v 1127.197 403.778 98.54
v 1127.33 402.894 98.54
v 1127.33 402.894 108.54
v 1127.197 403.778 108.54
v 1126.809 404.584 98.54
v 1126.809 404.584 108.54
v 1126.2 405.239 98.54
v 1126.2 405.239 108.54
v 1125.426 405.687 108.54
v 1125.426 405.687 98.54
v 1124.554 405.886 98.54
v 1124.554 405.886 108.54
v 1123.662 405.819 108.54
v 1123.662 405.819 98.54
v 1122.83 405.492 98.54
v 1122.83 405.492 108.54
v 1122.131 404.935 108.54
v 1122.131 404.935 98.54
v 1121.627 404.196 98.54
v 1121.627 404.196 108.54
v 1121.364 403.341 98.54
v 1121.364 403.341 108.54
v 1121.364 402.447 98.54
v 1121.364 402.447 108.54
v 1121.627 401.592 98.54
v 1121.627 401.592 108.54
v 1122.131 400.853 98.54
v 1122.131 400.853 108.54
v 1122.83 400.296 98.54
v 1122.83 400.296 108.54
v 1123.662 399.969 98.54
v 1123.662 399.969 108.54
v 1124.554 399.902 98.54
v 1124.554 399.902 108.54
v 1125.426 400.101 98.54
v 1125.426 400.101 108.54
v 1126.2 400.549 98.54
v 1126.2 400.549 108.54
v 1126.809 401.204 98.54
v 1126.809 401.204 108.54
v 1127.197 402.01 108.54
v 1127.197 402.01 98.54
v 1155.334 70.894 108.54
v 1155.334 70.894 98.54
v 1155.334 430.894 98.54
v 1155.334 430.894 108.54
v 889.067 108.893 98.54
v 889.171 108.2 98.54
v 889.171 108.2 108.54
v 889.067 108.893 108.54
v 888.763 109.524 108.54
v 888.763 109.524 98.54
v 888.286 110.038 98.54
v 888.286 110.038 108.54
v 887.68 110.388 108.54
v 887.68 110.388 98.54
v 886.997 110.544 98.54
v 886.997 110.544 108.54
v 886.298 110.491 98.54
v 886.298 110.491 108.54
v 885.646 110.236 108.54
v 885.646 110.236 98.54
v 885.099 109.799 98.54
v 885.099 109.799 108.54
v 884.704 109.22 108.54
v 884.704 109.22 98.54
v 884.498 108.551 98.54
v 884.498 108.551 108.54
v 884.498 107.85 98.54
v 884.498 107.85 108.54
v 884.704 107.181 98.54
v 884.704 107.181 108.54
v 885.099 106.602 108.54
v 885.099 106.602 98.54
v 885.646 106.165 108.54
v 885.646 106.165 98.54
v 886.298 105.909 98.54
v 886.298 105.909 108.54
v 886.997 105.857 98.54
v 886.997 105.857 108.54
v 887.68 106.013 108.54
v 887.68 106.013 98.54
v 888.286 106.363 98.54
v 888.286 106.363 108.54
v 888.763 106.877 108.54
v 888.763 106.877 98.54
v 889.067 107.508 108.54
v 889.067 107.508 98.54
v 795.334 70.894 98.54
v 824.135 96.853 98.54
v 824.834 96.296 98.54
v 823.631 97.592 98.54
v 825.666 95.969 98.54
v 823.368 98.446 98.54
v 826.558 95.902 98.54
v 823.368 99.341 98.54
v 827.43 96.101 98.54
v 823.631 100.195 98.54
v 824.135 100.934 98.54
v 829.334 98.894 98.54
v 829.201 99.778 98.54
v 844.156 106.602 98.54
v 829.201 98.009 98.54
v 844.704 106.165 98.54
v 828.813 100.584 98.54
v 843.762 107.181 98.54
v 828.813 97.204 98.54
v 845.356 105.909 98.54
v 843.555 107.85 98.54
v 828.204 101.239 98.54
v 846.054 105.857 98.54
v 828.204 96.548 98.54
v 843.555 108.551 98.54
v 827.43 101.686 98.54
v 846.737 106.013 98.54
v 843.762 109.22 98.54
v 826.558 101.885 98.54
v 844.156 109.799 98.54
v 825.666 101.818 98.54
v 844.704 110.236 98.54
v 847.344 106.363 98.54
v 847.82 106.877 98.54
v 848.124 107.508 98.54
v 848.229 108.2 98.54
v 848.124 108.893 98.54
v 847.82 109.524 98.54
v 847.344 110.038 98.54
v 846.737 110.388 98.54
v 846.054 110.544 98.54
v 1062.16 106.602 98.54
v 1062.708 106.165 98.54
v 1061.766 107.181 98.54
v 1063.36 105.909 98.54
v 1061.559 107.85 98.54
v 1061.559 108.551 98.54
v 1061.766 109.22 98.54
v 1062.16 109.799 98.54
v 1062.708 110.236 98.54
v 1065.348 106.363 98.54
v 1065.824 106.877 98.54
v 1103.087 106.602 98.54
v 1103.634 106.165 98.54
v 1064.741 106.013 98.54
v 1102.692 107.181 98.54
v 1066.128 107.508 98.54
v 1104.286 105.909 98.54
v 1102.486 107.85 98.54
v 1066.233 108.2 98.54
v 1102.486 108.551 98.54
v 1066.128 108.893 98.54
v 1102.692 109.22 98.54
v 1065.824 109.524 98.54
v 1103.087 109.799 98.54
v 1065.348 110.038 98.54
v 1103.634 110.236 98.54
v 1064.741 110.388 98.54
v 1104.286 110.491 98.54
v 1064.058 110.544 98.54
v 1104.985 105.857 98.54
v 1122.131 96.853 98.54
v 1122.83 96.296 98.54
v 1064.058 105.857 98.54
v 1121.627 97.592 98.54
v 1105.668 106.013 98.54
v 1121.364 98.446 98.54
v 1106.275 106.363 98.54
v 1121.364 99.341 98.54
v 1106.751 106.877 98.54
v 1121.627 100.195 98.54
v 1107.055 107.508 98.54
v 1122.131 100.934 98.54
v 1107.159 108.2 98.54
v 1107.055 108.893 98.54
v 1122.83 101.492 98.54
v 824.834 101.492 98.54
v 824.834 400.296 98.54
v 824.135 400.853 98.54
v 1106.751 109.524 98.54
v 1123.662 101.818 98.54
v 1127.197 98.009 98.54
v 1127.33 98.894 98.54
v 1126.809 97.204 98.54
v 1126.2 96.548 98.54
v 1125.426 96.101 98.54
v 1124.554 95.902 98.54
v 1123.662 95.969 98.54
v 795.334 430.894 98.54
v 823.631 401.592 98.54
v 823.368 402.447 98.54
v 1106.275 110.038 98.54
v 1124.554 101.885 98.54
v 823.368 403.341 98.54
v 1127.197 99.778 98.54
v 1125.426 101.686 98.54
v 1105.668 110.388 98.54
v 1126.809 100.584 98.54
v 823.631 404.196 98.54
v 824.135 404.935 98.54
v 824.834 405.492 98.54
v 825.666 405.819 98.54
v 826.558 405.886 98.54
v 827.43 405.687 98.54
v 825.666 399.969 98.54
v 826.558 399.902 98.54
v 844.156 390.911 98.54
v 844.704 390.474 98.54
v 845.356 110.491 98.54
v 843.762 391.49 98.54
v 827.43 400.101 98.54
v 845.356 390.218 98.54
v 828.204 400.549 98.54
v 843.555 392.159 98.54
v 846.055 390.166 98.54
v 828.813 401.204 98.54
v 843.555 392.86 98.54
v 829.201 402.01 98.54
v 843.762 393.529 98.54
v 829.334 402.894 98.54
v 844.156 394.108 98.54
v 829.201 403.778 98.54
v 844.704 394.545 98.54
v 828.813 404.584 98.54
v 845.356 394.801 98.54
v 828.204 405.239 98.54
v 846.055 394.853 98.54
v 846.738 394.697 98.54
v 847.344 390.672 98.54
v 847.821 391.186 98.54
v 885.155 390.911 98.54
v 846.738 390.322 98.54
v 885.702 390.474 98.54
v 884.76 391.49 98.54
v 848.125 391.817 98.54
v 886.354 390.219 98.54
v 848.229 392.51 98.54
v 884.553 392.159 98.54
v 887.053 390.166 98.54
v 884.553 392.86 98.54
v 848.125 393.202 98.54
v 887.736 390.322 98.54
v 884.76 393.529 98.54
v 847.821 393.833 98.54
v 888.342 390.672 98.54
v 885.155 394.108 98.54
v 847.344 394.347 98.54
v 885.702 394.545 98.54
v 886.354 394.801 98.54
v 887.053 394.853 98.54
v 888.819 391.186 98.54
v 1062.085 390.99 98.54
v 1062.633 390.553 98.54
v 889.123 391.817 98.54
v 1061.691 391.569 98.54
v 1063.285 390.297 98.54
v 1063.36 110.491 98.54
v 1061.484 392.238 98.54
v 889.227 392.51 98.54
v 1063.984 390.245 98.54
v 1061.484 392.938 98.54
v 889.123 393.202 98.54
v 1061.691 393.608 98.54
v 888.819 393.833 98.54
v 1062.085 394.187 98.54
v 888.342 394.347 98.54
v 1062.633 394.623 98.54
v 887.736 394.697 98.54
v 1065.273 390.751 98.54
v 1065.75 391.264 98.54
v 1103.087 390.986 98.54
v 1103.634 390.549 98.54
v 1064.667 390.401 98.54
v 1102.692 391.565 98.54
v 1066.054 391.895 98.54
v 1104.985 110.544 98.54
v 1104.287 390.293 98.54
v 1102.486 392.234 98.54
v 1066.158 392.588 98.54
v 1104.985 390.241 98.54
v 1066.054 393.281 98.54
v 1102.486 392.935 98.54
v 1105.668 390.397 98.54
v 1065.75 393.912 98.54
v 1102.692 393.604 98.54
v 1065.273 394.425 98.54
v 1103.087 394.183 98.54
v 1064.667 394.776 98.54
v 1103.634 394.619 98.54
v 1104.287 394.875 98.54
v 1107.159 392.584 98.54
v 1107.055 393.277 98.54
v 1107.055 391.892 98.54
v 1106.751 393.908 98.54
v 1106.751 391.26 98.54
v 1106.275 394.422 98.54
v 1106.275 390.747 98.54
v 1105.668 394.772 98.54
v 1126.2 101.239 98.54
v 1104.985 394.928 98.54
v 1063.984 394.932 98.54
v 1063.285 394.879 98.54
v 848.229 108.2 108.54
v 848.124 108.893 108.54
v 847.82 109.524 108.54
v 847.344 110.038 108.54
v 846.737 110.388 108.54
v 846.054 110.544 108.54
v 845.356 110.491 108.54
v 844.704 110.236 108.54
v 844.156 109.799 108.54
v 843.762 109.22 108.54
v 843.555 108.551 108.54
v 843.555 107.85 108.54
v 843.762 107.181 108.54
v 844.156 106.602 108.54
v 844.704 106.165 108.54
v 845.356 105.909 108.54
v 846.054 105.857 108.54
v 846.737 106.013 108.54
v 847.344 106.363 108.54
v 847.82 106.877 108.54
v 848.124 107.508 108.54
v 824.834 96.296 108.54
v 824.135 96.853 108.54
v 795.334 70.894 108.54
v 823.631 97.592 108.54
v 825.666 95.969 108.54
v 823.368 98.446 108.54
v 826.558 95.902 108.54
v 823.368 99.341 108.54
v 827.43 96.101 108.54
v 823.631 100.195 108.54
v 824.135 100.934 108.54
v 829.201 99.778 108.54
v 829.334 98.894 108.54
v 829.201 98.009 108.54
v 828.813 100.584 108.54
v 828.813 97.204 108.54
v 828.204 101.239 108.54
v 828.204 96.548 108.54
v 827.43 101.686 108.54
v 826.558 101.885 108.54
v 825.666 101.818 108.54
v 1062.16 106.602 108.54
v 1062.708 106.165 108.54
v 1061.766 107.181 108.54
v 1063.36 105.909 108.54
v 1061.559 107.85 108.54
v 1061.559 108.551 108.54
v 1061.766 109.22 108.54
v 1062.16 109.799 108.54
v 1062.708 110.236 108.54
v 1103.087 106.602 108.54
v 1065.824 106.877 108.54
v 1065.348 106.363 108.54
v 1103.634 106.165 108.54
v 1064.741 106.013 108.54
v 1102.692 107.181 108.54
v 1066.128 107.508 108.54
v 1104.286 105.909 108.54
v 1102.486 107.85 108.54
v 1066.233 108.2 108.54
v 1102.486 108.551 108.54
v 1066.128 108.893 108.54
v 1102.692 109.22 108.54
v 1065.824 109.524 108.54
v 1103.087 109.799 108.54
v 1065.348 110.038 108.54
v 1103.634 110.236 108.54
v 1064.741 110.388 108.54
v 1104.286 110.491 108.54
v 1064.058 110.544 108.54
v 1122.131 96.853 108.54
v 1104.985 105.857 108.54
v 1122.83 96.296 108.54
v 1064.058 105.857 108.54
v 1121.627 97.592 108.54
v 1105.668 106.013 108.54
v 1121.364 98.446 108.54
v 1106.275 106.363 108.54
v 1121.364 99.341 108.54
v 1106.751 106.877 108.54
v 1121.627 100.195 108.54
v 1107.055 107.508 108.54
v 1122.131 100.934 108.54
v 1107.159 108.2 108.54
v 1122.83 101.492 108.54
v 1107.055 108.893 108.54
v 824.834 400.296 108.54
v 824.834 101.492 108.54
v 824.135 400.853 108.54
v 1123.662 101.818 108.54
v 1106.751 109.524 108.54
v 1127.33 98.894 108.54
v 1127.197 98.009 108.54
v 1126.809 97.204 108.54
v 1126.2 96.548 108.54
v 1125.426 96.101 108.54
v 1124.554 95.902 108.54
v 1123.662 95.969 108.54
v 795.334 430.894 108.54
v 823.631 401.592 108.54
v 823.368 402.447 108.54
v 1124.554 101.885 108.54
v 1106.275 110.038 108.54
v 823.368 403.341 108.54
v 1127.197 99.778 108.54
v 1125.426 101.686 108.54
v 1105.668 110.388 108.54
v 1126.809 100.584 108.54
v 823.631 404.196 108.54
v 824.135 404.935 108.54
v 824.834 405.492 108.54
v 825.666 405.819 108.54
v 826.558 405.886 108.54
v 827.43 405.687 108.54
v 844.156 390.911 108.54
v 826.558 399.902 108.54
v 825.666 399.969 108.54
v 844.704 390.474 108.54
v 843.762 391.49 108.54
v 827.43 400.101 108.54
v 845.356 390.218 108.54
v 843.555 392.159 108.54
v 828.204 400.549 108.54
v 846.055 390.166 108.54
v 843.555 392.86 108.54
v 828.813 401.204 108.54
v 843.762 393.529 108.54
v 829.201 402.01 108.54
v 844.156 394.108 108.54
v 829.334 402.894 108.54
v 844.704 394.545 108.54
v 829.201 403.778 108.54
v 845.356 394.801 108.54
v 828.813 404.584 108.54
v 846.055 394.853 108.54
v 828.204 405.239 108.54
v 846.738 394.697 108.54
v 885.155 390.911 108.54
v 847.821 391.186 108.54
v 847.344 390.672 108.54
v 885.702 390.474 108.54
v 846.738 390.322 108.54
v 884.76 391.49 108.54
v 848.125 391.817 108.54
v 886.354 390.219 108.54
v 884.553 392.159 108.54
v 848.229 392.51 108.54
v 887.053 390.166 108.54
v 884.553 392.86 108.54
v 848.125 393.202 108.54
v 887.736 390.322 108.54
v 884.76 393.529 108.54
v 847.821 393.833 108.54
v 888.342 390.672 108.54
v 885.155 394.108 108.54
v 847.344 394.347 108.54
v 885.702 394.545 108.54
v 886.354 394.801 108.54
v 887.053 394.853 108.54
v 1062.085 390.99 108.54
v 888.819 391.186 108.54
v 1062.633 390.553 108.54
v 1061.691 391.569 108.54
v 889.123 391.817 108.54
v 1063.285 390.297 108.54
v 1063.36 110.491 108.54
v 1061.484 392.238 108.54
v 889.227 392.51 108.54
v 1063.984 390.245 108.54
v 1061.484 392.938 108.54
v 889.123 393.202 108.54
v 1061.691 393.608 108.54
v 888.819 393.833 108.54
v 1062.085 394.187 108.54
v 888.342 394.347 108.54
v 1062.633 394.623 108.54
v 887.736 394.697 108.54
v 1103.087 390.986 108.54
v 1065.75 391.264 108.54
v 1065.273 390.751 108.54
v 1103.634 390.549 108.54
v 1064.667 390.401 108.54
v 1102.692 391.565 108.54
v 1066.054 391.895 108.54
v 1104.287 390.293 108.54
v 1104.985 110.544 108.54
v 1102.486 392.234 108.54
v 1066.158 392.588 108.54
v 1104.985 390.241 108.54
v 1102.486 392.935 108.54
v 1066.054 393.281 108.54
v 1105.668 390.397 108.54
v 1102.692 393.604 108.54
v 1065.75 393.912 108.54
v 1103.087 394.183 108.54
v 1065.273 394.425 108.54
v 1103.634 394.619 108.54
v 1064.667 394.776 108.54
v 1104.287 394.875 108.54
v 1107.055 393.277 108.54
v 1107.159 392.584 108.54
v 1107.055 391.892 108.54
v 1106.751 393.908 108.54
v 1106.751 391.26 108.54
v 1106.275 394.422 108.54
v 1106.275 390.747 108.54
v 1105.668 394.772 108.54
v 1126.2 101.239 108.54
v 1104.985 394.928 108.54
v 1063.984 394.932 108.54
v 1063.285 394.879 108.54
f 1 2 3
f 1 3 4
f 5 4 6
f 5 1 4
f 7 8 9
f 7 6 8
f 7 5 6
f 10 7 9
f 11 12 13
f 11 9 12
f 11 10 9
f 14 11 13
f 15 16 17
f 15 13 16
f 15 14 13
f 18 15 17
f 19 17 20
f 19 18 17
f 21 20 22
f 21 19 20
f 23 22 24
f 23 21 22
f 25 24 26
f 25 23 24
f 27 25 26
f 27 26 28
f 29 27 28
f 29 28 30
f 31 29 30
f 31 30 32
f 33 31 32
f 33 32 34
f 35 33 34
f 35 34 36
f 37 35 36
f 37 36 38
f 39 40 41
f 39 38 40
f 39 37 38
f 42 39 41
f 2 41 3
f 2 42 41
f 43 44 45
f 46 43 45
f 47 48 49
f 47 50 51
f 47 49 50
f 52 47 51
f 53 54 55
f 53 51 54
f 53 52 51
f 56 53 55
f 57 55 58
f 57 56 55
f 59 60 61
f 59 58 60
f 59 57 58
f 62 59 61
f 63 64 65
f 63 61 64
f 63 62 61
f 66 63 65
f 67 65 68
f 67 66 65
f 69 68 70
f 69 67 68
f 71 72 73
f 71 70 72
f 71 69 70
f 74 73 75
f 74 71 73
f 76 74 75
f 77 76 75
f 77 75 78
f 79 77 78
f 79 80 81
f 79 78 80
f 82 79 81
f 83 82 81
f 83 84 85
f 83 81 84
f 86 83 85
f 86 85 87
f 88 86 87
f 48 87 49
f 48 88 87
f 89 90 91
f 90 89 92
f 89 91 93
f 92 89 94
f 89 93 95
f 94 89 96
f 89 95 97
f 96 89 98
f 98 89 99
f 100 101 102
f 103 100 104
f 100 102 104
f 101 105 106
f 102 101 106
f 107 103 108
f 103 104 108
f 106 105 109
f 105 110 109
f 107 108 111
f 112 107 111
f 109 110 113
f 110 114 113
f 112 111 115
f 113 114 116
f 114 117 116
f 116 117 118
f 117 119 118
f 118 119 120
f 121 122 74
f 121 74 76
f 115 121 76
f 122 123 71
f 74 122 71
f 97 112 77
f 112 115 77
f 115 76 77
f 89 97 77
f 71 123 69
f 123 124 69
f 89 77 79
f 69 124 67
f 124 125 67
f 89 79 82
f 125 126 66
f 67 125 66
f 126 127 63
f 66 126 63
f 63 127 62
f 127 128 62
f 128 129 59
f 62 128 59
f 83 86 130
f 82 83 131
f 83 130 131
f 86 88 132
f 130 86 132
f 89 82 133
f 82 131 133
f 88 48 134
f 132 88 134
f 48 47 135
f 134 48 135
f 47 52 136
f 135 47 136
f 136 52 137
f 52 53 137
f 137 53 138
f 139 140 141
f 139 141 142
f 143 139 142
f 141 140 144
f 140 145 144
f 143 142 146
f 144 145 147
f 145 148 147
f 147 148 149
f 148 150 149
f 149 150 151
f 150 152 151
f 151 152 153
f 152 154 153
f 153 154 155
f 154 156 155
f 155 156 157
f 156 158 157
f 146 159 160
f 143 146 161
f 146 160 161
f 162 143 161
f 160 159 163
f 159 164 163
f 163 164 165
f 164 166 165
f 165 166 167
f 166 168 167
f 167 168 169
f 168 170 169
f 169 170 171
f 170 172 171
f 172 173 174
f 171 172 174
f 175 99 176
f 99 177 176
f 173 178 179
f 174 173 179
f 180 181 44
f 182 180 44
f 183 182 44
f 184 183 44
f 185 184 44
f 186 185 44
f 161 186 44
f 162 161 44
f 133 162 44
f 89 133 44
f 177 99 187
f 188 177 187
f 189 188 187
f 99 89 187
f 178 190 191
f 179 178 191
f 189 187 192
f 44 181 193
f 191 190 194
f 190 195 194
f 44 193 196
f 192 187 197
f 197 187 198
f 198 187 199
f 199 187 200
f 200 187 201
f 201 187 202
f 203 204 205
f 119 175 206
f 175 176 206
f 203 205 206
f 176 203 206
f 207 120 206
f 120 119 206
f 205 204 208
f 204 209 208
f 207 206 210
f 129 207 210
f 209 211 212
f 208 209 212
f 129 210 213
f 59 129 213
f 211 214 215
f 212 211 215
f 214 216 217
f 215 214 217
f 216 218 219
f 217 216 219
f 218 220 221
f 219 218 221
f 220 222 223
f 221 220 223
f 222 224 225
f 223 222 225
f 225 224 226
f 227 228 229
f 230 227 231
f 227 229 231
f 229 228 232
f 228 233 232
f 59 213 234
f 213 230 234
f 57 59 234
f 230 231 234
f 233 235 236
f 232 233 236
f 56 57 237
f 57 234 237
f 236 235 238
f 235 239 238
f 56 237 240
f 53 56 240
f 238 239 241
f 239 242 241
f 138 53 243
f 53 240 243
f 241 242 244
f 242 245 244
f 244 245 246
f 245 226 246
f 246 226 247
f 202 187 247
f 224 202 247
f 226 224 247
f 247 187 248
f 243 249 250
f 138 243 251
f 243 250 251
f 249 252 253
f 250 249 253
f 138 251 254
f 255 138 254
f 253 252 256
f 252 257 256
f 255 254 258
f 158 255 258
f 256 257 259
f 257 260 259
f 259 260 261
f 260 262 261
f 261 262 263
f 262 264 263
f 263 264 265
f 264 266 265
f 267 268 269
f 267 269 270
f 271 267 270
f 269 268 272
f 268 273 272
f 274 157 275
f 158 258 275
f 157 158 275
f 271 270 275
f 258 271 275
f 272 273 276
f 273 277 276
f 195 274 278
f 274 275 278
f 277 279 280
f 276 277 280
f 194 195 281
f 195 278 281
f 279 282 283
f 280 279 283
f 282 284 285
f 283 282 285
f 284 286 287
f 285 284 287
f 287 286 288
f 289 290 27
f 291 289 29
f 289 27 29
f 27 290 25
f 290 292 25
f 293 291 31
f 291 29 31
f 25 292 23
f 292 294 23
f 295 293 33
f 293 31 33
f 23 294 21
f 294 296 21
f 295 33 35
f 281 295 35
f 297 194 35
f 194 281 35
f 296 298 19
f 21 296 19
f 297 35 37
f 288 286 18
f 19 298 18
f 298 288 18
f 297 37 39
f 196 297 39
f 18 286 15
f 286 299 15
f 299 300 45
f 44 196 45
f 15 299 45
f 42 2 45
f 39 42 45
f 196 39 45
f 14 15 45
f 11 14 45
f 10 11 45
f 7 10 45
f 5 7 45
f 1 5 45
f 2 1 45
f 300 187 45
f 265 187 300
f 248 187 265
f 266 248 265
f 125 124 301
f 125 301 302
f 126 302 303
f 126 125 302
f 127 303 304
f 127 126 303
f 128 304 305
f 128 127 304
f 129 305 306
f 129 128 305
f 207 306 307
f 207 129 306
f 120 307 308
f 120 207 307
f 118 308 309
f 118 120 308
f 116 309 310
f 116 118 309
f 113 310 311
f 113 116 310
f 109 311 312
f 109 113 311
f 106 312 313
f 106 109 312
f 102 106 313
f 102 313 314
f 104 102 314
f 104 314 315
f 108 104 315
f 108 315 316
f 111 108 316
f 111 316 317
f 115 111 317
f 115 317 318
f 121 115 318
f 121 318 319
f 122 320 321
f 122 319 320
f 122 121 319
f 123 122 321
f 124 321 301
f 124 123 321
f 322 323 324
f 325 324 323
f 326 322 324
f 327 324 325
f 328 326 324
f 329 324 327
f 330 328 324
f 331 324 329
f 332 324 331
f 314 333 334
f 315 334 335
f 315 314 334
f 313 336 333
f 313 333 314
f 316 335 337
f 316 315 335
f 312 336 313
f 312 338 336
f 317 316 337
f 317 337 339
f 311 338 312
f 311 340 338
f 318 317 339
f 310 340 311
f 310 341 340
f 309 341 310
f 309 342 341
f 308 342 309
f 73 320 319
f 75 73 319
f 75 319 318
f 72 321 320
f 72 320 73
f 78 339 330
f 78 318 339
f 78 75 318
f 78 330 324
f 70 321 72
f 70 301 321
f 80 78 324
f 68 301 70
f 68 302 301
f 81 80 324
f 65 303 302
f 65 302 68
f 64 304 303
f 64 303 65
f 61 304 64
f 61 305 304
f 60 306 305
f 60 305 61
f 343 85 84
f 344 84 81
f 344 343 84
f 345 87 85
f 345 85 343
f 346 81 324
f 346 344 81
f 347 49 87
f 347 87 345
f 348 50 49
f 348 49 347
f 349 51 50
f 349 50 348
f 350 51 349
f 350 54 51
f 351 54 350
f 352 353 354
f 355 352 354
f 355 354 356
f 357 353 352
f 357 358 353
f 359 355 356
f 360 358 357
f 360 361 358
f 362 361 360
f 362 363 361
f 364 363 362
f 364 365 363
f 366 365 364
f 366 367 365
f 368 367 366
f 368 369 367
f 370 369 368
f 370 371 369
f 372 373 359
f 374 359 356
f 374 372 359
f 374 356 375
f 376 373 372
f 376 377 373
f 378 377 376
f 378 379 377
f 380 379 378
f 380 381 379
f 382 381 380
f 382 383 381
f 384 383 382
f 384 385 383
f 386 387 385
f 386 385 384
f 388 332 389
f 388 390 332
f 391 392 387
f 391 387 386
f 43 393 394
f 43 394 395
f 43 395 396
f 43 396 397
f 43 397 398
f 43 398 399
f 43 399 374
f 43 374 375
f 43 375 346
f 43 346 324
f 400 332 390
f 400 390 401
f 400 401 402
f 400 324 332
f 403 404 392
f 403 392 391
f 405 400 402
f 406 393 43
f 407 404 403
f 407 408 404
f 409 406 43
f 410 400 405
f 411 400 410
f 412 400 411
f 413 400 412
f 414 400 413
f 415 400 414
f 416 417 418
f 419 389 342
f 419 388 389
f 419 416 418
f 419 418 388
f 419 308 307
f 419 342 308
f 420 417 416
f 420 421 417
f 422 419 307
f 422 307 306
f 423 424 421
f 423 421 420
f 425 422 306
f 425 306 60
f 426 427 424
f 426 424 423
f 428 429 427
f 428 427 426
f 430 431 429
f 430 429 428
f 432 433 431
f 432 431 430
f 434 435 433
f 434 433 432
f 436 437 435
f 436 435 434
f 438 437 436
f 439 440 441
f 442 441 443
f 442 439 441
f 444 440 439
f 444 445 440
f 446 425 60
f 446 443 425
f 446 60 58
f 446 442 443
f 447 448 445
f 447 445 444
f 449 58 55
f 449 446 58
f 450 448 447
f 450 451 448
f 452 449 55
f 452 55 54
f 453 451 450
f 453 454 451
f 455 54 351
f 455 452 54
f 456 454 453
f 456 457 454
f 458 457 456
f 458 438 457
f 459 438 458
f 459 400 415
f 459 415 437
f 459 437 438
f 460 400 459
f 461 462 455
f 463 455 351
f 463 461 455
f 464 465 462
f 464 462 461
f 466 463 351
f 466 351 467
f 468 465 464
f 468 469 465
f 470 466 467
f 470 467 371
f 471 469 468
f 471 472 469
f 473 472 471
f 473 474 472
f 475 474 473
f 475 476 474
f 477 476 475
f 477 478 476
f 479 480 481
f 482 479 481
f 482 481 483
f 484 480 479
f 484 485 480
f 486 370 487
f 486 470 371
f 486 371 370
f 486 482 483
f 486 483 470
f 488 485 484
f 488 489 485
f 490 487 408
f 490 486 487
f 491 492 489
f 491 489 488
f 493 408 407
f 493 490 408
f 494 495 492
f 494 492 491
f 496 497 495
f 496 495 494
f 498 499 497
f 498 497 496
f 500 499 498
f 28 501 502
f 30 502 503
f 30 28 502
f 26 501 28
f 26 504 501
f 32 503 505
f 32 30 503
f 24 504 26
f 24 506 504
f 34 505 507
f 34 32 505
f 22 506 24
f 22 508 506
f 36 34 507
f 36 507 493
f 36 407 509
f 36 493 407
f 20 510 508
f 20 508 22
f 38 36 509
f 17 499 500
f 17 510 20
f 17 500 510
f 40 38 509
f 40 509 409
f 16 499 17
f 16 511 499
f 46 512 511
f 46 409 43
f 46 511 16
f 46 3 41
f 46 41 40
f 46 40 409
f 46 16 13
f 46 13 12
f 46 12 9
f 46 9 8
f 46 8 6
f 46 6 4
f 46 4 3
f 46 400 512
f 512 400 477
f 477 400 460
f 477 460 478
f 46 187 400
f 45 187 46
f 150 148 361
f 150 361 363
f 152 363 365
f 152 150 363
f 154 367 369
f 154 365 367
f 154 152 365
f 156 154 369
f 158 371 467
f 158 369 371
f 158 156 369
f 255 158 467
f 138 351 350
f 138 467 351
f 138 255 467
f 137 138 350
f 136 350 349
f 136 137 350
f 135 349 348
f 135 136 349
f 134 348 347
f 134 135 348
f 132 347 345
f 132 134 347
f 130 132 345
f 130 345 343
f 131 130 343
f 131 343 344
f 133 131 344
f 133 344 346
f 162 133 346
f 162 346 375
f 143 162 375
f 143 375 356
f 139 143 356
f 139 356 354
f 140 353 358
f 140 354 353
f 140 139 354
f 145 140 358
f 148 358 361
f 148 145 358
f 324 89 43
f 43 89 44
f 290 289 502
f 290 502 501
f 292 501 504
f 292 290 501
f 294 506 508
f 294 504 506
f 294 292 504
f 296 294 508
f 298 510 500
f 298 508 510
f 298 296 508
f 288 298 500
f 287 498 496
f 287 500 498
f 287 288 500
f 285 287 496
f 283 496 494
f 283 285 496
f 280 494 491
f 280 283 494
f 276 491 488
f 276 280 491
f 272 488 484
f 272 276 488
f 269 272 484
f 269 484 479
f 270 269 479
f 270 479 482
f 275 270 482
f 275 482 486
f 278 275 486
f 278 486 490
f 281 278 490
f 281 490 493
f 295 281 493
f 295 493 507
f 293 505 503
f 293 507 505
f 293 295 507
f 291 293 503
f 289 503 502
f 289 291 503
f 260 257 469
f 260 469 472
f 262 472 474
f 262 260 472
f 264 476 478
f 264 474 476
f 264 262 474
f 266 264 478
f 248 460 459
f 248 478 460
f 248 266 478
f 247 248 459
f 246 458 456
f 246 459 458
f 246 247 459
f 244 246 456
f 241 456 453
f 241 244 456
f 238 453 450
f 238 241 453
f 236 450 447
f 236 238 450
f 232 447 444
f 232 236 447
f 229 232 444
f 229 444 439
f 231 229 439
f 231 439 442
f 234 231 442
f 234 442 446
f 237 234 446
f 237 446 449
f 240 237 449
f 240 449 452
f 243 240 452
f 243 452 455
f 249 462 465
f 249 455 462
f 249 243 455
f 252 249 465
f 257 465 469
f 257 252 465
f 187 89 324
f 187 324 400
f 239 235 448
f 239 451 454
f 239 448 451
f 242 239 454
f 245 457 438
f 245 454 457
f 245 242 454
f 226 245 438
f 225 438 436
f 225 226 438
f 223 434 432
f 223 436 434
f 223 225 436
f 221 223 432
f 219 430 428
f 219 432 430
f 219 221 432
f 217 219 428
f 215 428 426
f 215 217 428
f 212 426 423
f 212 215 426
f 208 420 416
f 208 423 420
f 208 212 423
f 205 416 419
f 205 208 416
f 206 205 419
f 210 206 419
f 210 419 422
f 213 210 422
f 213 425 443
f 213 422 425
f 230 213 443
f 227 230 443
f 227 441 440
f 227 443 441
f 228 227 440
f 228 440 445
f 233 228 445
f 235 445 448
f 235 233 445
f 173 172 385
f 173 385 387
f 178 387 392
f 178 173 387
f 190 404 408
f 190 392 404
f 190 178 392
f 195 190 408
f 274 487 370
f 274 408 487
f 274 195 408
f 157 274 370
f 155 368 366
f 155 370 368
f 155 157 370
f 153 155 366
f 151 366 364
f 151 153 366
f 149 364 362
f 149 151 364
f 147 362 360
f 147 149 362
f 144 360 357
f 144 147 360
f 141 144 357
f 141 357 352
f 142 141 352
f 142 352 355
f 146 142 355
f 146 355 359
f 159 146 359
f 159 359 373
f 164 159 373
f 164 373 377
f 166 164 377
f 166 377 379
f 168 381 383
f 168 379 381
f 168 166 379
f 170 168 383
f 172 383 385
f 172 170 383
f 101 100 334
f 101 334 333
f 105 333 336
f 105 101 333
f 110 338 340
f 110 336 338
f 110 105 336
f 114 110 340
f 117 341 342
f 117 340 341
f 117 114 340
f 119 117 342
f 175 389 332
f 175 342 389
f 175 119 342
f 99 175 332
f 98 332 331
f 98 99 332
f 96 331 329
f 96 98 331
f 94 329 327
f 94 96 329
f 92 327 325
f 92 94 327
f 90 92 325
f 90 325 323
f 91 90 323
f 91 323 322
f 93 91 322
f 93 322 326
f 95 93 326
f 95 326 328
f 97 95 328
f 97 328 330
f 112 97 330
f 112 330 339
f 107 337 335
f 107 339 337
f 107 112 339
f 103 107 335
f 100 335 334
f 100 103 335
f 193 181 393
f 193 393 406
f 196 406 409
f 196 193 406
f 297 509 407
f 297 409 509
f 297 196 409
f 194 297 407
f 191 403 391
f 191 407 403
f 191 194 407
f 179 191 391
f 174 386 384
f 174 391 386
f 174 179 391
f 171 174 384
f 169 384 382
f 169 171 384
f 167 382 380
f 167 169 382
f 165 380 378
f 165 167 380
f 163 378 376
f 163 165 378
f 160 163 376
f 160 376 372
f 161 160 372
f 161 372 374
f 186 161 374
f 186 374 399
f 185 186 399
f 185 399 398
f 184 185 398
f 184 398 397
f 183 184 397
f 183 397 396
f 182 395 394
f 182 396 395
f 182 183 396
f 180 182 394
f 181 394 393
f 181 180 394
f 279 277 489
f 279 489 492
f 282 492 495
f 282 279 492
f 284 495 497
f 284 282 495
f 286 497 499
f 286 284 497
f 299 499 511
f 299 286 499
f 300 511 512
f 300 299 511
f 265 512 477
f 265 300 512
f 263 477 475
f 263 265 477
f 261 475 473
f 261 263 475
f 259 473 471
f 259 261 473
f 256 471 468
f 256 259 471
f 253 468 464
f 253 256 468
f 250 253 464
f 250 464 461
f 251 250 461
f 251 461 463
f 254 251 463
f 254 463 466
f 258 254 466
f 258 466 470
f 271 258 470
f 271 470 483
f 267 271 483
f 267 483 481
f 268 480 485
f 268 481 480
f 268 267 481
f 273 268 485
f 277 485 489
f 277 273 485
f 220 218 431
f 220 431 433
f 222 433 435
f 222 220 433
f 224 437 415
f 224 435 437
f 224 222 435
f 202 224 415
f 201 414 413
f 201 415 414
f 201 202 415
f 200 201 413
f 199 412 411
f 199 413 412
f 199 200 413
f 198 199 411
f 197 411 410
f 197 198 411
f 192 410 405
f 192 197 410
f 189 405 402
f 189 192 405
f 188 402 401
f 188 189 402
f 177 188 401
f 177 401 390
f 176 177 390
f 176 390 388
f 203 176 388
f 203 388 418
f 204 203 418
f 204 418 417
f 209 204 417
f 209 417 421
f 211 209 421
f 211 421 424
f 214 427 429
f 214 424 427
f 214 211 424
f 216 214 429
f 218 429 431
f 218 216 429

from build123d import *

# Parameters (mm, degrees)
CYLINDER011_R     = 3
CYLINDER011_DEPTH = 80
CYLINDER010_R     = 3
CYLINDER010_DEPTH = 80
CYLINDER009_R     = 3
CYLINDER009_DEPTH = 80
CYLINDER008_R     = 3
CYLINDER008_DEPTH = 80
CYLINDER007_R     = 2.35
CYLINDER007_DEPTH = 100
CYLINDER006_R     = 2.35
CYLINDER006_DEPTH = 100
CYLINDER005_R     = 2.35
CYLINDER005_DEPTH = 100
CYLINDER004_R     = 2.35
CYLINDER004_DEPTH = 100
CYLINDER003_R     = 2.35
CYLINDER003_DEPTH = 100
CYLINDER002_R     = 2.35
CYLINDER002_DEPTH = 100
CYLINDER001_R     = 2.35
CYLINDER001_DEPTH = 100
CYLINDER_R        = 2.35
CYLINDER_DEPTH    = 100
BOX_W             = 360
BOX_H             = 360
BOX_DEPTH         = 10


with BuildPart() as cylinder011:
    # Cylinder011 → Cylinder011 (new body)
    with BuildSketch(Plane(origin=(1124.33, 402.894, 72.563), x_dir=(1, 0, 0), z_dir=(0, 0, 1))):
        Circle(CYLINDER011_R)
    extrude(amount=CYLINDER011_DEPTH)


with BuildPart() as cylinder010:
    # Cylinder010 → Cylinder010 (new body)
    with BuildSketch(Plane(origin=(826.334, 402.894, 72.563), x_dir=(1, 0, 0), z_dir=(0, 0, 1))):
        Circle(CYLINDER010_R)
    extrude(amount=CYLINDER010_DEPTH)


with BuildPart() as cylinder009:
    # Cylinder009 → Cylinder009 (new body)
    with BuildSketch(Plane(origin=(1124.33, 98.8936, 72.563), x_dir=(1, 0, 0), z_dir=(0, 0, 1))):
        Circle(CYLINDER009_R)
    extrude(amount=CYLINDER009_DEPTH)


with BuildPart() as cylinder008:
    # Cylinder008 → Cylinder008 (new body)
    with BuildSketch(Plane(origin=(826.334, 98.8936, 72.563), x_dir=(1, 0, 0), z_dir=(0, 0, 1))):
        Circle(CYLINDER008_R)
    extrude(amount=CYLINDER008_DEPTH)


with BuildPart() as cylinder007:
    # Cylinder007 → Cylinder007 (new body)
    with BuildSketch(Plane(origin=(1104.809448, 392.584259, 42.012749), x_dir=(1, 0, 0), z_dir=(0, 0, 1))):
        Circle(CYLINDER007_R)
    extrude(amount=CYLINDER007_DEPTH)


with BuildPart() as cylinder006:
    # Cylinder006 → Cylinder006 (new body)
    with BuildSketch(Plane(origin=(1063.807983, 392.588165, 42.012753), x_dir=(1, 0, 0), z_dir=(0, 0, 1))):
        Circle(CYLINDER006_R)
    extrude(amount=CYLINDER006_DEPTH)


with BuildPart() as cylinder005:
    # Cylinder005 → Cylinder005 (new body)
    with BuildSketch(Plane(origin=(886.877197, 392.509613, 42.012726), x_dir=(1, 0, 0), z_dir=(0, 0, 1))):
        Circle(CYLINDER005_R)
    extrude(amount=CYLINDER005_DEPTH)


with BuildPart() as cylinder004:
    # Cylinder004 → Cylinder004 (new body)
    with BuildSketch(Plane(origin=(845.87915, 392.509552, 42.012745), x_dir=(1, 0, 0), z_dir=(0, 0, 1))):
        Circle(CYLINDER004_R)
    extrude(amount=CYLINDER004_DEPTH)


with BuildPart() as cylinder003:
    # Cylinder003 → Cylinder003 (new body)
    with BuildSketch(Plane(origin=(1104.809326, 108.200371, 42.012733), x_dir=(1, 0, 0), z_dir=(0, 0, 1))):
        Circle(CYLINDER003_R)
    extrude(amount=CYLINDER003_DEPTH)


with BuildPart() as cylinder002:
    # Cylinder002 → Cylinder002 (new body)
    with BuildSketch(Plane(origin=(1063.882812, 108.200386, 42.012733), x_dir=(1, 0, 0), z_dir=(0, 0, 1))):
        Circle(CYLINDER002_R)
    extrude(amount=CYLINDER002_DEPTH)


with BuildPart() as cylinder001:
    # Cylinder001 → Cylinder001 (new body)
    with BuildSketch(Plane(origin=(886.821289, 108.200371, 42.012745), x_dir=(1, 0, 0), z_dir=(0, 0, 1))):
        Circle(CYLINDER001_R)
    extrude(amount=CYLINDER001_DEPTH)


with BuildPart() as cylinder:
    # Cylinder → Cylinder (new body)
    with BuildSketch(Plane(origin=(845.878784, 108.200371, 42.012741), x_dir=(1, 0, 0), z_dir=(0, 0, 1))):
        Circle(CYLINDER_R)
    extrude(amount=CYLINDER_DEPTH)


with BuildPart() as cut011:
    # Box → Box (new body)
    with BuildSketch(Plane(origin=(795.334, 70.893601, 98.539999), x_dir=(1, 0, 0), z_dir=(0, 0, 1))):
        with Locations((180, 180)):
            Rectangle(BOX_W, BOX_H)
    extrude(amount=BOX_DEPTH)

    # Cut: cut Cylinder
    add(cylinder.part, mode=Mode.SUBTRACT)

    # Cut001: cut Cylinder001
    add(cylinder001.part, mode=Mode.SUBTRACT)

    # Cut002: cut Cylinder002
    add(cylinder002.part, mode=Mode.SUBTRACT)

    # Cut003: cut Cylinder003
    add(cylinder003.part, mode=Mode.SUBTRACT)

    # Cut004: cut Cylinder004
    add(cylinder004.part, mode=Mode.SUBTRACT)

    # Cut005: cut Cylinder005
    add(cylinder005.part, mode=Mode.SUBTRACT)

    # Cut006: cut Cylinder006
    add(cylinder006.part, mode=Mode.SUBTRACT)

    # Cut007: cut Cylinder007
    add(cylinder007.part, mode=Mode.SUBTRACT)

    # Cut008: cut Cylinder008
    add(cylinder008.part, mode=Mode.SUBTRACT)

    # Cut009: cut Cylinder009
    add(cylinder009.part, mode=Mode.SUBTRACT)

    # Cut010: cut Cylinder010
    add(cylinder010.part, mode=Mode.SUBTRACT)

    # Cut011: cut Cylinder011
    add(cylinder011.part, mode=Mode.SUBTRACT)


solid = cut011.part
